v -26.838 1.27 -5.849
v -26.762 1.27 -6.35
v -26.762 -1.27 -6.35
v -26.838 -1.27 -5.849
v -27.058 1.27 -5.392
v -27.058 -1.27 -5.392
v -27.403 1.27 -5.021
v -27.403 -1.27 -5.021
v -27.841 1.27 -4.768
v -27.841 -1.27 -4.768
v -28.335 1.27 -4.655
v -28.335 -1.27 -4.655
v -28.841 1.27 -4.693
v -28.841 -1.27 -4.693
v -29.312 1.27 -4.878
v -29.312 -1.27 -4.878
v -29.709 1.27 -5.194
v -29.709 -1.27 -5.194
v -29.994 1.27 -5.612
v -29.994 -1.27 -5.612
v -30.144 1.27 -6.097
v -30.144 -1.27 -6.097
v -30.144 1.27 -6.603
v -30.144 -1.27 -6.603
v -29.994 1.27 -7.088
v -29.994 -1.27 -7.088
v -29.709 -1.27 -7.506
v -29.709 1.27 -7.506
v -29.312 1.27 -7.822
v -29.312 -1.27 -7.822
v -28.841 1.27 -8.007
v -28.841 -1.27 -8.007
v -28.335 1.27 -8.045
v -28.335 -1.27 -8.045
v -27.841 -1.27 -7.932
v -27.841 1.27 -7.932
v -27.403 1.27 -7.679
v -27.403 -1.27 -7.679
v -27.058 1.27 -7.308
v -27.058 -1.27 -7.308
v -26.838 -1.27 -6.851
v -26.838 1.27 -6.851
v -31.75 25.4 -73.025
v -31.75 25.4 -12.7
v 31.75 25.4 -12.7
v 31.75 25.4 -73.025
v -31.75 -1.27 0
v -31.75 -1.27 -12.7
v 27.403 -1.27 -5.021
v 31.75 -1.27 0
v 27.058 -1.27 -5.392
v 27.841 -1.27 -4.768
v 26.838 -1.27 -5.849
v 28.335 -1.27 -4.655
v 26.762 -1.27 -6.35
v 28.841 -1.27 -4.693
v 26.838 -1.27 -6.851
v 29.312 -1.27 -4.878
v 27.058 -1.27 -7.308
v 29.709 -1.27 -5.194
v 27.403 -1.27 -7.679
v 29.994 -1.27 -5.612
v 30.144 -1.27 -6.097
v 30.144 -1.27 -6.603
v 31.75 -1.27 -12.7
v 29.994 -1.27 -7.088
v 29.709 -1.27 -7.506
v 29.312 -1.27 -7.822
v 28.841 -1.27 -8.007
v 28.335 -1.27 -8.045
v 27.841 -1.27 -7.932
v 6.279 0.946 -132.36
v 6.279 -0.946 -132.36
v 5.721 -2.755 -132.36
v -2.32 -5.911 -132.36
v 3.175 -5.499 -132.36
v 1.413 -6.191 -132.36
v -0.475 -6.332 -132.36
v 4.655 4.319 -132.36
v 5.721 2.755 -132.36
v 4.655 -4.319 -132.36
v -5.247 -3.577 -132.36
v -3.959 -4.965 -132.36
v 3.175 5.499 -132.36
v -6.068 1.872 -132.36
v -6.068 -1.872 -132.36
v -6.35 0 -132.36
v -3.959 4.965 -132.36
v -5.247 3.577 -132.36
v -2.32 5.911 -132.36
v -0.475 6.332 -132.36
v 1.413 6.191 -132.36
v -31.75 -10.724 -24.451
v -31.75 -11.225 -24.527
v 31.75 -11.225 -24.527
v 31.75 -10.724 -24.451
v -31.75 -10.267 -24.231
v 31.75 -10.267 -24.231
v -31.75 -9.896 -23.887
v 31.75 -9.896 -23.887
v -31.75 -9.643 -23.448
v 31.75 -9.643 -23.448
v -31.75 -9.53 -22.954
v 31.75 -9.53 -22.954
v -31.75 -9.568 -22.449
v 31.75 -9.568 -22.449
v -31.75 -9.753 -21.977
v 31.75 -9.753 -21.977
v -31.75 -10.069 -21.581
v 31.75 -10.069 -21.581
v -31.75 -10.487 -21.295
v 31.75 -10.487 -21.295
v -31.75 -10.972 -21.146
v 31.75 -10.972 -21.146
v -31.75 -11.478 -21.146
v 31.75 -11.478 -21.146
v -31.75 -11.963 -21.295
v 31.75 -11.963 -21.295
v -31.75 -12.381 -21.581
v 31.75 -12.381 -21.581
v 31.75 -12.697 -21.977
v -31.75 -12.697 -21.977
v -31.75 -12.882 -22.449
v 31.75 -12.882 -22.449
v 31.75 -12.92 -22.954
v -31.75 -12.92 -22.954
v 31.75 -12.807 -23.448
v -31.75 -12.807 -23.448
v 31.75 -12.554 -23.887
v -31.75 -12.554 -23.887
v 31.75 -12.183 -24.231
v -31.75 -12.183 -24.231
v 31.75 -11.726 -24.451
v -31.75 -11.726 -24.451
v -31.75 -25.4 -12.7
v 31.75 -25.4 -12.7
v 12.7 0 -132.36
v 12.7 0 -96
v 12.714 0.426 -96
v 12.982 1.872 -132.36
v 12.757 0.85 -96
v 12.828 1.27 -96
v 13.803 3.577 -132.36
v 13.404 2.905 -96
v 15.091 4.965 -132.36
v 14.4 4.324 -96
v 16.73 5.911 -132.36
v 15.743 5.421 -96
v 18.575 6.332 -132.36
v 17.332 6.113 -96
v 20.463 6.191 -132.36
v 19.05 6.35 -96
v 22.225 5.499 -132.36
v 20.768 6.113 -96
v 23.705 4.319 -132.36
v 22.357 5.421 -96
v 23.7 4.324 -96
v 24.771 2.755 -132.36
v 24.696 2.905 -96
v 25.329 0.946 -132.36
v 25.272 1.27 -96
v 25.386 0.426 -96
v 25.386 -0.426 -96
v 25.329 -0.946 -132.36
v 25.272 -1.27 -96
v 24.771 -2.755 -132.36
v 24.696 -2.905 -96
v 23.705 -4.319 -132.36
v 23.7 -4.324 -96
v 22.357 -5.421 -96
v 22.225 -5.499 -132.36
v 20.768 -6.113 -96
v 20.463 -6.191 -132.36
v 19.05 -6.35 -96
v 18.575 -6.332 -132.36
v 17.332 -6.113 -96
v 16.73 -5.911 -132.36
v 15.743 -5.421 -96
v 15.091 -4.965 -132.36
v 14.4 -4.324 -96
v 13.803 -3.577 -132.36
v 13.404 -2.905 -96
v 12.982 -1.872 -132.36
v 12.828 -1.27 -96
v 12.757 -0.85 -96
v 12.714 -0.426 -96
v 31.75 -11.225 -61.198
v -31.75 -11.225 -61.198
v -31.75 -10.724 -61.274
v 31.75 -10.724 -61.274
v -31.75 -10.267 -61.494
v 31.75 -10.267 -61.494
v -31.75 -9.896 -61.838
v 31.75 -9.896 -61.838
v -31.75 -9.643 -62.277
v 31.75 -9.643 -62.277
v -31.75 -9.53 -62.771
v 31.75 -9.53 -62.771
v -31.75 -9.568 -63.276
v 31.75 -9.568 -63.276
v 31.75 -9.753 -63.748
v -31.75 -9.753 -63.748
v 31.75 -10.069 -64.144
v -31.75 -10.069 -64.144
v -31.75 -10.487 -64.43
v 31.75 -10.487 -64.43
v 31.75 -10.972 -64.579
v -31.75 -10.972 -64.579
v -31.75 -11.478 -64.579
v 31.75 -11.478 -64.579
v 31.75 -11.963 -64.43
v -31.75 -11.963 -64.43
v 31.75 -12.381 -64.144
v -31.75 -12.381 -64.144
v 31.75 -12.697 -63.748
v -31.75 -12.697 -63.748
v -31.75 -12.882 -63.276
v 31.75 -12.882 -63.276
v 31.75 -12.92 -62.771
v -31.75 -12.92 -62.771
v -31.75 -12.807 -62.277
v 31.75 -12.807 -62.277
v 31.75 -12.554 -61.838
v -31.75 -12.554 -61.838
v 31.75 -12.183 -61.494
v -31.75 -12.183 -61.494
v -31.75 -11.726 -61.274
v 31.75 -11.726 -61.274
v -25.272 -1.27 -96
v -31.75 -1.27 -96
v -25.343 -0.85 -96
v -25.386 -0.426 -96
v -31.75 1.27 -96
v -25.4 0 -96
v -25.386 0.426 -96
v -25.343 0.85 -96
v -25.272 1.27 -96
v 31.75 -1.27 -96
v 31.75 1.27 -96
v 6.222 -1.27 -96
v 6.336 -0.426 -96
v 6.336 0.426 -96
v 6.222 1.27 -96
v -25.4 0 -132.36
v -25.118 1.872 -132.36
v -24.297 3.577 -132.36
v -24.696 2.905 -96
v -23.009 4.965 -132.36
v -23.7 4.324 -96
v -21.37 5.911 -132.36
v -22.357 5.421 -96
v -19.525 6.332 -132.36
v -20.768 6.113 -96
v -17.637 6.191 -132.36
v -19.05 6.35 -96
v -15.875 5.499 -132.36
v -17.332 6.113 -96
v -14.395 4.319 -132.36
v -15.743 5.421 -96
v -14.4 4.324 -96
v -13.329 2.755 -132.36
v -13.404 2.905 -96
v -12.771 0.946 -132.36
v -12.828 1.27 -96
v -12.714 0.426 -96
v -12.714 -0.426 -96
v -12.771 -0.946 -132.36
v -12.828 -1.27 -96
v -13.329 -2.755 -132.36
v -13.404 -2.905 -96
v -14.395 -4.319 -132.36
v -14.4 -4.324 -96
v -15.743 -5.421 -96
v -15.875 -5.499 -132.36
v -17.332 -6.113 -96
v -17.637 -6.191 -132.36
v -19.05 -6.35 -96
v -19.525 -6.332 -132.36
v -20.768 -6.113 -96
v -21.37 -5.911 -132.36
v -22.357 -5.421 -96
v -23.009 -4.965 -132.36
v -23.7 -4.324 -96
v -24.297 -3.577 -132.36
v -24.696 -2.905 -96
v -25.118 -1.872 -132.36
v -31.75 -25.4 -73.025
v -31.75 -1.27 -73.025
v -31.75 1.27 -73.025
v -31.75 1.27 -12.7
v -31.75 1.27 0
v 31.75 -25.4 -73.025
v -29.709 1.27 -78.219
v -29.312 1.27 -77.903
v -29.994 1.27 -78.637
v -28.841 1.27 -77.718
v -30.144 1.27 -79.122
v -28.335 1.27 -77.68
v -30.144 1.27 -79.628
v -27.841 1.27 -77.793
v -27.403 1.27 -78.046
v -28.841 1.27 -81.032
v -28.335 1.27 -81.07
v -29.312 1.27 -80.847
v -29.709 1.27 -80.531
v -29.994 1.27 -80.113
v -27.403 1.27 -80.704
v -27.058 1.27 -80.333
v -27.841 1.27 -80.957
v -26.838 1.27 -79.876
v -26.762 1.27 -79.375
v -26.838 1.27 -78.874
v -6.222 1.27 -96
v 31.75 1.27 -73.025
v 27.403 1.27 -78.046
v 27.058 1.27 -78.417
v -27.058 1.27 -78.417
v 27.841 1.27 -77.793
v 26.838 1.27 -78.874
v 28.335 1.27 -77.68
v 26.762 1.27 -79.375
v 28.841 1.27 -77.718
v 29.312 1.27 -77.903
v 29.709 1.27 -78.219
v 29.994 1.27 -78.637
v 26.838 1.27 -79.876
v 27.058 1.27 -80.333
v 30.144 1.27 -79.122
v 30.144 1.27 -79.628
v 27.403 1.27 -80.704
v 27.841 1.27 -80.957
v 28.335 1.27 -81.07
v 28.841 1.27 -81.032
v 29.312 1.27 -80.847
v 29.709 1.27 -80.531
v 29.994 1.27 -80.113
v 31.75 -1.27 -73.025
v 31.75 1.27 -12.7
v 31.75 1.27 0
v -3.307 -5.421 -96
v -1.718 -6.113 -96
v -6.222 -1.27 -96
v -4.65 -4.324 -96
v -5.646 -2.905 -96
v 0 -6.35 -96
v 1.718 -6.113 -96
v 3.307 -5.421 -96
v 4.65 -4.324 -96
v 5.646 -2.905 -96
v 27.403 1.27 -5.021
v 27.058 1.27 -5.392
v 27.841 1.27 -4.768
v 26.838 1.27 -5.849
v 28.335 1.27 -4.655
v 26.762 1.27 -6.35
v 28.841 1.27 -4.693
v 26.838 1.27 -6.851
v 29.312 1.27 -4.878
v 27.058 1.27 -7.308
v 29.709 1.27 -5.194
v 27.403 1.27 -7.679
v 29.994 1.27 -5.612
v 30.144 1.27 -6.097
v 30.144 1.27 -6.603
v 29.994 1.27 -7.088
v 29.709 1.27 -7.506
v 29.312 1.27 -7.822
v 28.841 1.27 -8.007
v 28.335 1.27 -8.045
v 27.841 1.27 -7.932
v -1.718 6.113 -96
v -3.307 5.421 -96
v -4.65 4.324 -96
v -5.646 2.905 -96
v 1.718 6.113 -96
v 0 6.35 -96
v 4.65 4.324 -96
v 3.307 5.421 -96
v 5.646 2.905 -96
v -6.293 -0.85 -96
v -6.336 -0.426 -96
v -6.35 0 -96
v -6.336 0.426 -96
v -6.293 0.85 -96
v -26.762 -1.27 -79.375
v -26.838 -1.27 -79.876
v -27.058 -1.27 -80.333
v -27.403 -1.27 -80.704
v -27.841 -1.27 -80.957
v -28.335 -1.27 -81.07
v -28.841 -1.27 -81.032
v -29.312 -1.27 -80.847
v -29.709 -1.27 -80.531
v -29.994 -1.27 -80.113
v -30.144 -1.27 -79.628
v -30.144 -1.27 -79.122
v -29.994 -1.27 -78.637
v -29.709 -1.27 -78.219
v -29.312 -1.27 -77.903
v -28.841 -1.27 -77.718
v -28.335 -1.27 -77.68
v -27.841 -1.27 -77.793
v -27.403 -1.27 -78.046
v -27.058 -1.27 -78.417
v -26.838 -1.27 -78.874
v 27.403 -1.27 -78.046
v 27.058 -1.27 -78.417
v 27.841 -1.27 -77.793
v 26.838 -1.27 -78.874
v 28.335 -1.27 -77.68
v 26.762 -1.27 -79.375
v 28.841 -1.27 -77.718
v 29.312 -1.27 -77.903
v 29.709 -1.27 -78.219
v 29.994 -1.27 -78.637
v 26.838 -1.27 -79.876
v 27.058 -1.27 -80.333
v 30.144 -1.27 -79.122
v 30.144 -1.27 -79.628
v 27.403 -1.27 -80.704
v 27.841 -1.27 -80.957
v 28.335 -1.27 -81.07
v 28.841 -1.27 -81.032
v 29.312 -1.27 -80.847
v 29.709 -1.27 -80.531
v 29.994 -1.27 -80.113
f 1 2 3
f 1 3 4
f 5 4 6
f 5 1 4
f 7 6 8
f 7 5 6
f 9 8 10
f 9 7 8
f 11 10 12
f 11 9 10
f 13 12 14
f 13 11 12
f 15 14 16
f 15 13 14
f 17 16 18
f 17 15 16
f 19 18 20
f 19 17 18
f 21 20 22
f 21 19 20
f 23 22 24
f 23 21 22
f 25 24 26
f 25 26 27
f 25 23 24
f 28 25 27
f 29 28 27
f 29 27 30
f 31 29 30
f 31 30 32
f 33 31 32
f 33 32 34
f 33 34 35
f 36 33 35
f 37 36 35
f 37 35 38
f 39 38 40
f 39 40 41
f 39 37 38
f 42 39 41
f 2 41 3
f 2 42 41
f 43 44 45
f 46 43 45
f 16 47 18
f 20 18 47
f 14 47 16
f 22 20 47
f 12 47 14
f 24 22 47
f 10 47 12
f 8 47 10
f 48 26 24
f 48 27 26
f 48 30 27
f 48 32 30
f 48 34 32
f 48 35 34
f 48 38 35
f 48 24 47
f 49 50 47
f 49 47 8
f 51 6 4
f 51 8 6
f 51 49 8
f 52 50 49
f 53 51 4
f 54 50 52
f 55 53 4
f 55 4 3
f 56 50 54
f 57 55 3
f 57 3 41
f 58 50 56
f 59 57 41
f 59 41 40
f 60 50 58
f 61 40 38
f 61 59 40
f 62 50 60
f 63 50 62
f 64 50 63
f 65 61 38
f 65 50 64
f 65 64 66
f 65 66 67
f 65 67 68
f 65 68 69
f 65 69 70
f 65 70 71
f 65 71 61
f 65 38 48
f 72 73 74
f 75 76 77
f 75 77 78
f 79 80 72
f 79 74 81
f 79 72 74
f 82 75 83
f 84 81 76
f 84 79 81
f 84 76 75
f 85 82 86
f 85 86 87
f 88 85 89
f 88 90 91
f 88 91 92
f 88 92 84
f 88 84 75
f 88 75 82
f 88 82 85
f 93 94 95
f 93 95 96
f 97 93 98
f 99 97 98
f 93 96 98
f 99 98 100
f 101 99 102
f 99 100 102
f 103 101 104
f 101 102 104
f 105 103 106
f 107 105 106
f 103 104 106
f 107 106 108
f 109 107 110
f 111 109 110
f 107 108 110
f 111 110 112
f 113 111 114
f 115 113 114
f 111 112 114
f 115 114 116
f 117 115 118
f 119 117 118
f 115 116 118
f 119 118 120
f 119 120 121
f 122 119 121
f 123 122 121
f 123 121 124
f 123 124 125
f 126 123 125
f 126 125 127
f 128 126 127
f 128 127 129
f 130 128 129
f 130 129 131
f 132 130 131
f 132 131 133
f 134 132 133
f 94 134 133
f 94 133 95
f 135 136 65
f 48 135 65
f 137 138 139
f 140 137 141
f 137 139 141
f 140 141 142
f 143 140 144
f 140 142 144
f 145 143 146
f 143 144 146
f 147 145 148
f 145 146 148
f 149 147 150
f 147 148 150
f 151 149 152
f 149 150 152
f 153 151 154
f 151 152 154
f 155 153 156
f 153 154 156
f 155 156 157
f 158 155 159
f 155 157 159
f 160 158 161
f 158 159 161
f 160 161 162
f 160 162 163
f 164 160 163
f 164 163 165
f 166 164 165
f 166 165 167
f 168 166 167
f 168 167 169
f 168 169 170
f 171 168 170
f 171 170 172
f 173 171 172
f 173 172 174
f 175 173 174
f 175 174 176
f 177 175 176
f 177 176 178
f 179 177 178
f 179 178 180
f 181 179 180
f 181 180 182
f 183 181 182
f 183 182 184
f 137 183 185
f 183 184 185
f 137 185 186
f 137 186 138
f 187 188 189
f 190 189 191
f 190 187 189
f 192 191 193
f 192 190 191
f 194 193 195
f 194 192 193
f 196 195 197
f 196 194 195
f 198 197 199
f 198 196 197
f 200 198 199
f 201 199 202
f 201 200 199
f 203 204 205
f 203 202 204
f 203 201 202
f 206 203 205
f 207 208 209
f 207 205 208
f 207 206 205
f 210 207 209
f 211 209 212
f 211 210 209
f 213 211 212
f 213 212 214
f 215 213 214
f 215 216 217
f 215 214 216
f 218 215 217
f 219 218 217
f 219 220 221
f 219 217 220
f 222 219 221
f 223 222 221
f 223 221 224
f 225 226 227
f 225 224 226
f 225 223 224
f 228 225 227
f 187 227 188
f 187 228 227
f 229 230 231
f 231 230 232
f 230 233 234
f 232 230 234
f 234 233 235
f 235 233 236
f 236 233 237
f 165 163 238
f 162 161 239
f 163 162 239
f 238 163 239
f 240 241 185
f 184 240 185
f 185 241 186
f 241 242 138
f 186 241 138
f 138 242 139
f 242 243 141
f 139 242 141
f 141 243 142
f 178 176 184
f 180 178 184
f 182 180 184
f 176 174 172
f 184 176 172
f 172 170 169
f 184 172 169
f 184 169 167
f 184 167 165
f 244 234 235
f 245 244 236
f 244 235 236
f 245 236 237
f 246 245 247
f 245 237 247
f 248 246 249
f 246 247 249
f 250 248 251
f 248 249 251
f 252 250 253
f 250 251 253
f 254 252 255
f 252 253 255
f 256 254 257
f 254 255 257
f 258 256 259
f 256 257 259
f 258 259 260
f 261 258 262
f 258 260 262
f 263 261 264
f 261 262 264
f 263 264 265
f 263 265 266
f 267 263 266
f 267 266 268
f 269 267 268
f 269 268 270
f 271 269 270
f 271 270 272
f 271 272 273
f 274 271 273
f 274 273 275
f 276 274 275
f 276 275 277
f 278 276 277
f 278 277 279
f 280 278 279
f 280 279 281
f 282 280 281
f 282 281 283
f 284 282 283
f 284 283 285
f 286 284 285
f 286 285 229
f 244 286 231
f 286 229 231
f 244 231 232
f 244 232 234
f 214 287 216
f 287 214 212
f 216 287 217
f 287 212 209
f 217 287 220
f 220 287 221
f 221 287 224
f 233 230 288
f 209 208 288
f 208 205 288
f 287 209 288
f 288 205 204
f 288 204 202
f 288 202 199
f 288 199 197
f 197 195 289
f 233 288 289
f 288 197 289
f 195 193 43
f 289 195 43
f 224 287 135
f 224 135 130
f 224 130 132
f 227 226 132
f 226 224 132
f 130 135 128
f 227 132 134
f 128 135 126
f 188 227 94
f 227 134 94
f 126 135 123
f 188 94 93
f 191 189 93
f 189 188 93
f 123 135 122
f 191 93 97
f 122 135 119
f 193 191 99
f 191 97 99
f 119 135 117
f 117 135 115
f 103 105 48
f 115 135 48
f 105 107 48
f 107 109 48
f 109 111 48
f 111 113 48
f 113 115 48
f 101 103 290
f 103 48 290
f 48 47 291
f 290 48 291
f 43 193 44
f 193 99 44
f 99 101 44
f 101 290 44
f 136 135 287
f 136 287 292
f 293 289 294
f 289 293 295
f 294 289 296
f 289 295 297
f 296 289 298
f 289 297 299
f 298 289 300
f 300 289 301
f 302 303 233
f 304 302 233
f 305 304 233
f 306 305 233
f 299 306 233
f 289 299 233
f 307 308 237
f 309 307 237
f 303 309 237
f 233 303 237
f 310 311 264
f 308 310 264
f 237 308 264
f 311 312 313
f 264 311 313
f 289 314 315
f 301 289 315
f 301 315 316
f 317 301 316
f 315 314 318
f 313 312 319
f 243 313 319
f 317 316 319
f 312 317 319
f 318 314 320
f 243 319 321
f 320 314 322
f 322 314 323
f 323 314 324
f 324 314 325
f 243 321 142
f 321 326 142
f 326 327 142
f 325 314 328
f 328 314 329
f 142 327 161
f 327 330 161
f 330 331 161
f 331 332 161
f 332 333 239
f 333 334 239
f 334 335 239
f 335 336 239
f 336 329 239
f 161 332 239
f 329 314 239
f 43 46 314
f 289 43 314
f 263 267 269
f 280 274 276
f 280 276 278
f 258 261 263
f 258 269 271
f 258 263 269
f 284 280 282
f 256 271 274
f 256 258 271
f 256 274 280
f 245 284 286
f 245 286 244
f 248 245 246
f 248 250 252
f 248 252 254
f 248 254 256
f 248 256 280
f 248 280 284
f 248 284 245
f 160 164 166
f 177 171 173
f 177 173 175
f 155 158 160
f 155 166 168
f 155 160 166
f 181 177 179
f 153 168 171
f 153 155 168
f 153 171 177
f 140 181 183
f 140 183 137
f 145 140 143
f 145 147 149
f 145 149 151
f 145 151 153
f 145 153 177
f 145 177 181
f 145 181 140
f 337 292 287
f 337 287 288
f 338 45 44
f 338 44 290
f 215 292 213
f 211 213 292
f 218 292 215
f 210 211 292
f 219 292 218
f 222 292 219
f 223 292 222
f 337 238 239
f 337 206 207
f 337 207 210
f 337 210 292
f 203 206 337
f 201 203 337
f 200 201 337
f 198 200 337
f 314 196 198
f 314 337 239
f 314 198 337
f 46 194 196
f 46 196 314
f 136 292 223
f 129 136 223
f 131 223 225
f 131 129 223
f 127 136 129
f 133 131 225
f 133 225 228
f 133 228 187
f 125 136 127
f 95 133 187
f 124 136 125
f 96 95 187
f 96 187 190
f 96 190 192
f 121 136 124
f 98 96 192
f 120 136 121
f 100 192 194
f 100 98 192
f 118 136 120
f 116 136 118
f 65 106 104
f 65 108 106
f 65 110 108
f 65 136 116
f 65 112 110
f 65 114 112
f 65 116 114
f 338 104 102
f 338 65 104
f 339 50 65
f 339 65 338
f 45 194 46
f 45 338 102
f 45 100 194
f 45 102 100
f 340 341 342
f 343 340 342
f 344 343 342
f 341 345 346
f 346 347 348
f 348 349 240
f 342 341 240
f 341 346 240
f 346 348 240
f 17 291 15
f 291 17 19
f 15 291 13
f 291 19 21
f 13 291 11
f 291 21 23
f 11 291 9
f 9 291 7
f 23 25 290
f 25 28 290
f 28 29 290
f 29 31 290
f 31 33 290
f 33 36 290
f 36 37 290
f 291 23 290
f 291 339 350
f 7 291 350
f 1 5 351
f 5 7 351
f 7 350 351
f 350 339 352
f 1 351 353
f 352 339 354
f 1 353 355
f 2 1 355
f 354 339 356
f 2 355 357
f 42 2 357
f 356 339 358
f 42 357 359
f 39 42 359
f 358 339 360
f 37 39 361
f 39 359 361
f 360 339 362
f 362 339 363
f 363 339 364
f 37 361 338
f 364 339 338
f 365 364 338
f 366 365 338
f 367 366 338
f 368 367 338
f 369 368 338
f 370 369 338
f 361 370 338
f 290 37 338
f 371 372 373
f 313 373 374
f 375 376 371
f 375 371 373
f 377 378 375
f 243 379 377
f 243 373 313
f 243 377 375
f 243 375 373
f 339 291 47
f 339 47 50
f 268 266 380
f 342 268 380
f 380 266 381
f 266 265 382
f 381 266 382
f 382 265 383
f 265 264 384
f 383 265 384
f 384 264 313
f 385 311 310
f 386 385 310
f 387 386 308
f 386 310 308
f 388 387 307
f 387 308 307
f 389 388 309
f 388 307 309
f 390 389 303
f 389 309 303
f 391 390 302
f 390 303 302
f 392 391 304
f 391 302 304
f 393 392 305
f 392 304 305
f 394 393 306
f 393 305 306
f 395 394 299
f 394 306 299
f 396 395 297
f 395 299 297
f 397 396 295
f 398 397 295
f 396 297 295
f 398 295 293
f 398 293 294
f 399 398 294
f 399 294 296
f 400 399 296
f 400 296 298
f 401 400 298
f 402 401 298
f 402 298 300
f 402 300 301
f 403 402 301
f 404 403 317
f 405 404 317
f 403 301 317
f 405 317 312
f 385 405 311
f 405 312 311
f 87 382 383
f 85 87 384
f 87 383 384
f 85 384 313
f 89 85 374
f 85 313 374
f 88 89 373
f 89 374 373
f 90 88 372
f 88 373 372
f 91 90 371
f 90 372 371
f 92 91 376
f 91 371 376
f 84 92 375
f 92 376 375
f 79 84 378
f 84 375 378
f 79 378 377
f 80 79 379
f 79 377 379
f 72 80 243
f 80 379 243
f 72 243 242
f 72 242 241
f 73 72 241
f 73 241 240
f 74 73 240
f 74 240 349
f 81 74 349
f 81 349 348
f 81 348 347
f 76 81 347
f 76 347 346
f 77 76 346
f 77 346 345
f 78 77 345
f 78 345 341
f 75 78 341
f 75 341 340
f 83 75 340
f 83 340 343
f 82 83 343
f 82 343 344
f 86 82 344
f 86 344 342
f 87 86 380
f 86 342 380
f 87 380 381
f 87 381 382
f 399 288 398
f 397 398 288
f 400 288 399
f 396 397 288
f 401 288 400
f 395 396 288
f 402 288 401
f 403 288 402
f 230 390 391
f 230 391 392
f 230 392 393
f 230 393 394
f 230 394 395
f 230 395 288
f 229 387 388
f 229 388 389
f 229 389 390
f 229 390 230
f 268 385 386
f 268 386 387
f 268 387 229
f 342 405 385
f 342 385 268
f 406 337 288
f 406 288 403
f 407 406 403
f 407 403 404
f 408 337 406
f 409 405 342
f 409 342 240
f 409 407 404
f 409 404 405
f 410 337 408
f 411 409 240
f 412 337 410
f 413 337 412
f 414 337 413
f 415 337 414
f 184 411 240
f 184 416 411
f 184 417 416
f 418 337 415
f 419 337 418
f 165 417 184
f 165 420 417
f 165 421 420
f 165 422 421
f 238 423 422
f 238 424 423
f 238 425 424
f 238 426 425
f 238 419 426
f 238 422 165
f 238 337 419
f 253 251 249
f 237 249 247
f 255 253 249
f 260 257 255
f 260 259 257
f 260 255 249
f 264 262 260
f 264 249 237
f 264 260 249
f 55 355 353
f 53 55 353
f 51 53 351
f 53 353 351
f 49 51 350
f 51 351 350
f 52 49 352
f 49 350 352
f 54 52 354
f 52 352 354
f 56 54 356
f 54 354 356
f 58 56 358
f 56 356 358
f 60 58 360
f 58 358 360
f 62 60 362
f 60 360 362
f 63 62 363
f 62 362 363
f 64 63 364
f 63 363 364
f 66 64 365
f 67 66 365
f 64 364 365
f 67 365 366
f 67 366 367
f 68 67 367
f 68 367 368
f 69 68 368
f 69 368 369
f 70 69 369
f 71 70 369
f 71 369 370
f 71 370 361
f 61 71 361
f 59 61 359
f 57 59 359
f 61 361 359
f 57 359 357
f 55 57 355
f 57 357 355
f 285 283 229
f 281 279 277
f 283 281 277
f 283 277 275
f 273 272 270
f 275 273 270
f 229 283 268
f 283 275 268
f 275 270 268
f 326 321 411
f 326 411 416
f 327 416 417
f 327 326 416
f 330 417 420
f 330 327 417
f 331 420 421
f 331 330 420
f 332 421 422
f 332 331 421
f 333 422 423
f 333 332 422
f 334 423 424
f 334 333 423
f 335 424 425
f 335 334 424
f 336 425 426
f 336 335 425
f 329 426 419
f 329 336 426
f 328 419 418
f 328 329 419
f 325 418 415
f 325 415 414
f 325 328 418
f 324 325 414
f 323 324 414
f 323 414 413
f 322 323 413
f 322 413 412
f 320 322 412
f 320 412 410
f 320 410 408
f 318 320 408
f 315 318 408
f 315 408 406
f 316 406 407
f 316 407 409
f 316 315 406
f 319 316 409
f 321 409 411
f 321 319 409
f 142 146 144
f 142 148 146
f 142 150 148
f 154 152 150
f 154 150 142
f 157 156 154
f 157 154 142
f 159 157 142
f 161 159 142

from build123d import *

# Parameters (mm, degrees)
SKETCH1_W               = 63.5
SKETCH1_H               = 50.8
BOSS_EXTRUDE1_DEPTH     = 96
SKETCH2_R               = 6.35
BOSS_EXTRUDE5_DEPTH     = 36.36
SKETCH3_W               = 12.7
SKETCH3_H               = 24.13
SKETCH3_W_2             = 22.975
CUT_EXTRUDE1_DEPTH      = 64.5
SKETCH4_R               = 1.7
CUT_EXTRUDE2_DEPTH      = 2.54
MIRROR3_COPY_1_SKETCH_R = 1.7
MIRROR3_COPY_1_DEPTH    = 2.54
SKETCH5_R               = 1.7
CUT_EXTRUDE3_DEPTH      = 64.5


with BuildPart() as part:
    # Sketch1 → Boss-Extrude1 (new body)
    with BuildSketch(Plane.XY):
        Rectangle(SKETCH1_W, SKETCH1_H)
    extrude(amount=-BOSS_EXTRUDE1_DEPTH)

    # Sketch2 → Boss-Extrude5 (add)
    with BuildSketch(Plane(origin=(0, 0, -96), x_dir=(-1, 0, 0), z_dir=(0, 0, -1))):
        Circle(SKETCH2_R)
        with Locations((-19.05, 0)):
            Circle(SKETCH2_R)
        with Locations((19.05, 0)):
            Circle(SKETCH2_R)
    extrude(amount=BOSS_EXTRUDE5_DEPTH)

    # Sketch3 → Cut-Extrude1 (cut, through all)
    with BuildSketch(Plane(origin=(31.75, 0, 0), x_dir=(0, 0, -1), z_dir=(1, 0, 0))):
        with Locations((6.35, -13.335)):
            Rectangle(SKETCH3_W, SKETCH3_H)
        with Locations((84.5125, -13.335)):
            Rectangle(SKETCH3_W_2, SKETCH3_H)
    cut_extrude1 = extrude(amount=-CUT_EXTRUDE1_DEPTH, mode=Mode.SUBTRACT)

    # Mirror1: Cut-Extrude1 across plane
    add(cut_extrude1.mirror(Plane.ZX), mode=Mode.SUBTRACT)

    # Sketch4 → Cut-Extrude2 (cut)
    with BuildSketch(Plane(origin=(0, 1.27, 0), x_dir=(1, 0, 0), z_dir=(0, 1, 0))):
        with Locations((-28.4625, 79.375)):
            Circle(SKETCH4_R)
    cut_extrude2 = extrude(amount=-CUT_EXTRUDE2_DEPTH, mode=Mode.SUBTRACT)

    # Mirror2: Cut-Extrude2 across plane
    add(cut_extrude2.mirror(Plane(origin=(0, 0, 0), x_dir=(0, 0, 1), z_dir=(1, 0, 0))), mode=Mode.SUBTRACT)

    # Mirror3: Cut-Extrude2 across plane
    add(cut_extrude2.mirror(Plane(origin=(0, 0, -42.8625), x_dir=(1, 0, 0), z_dir=(0, 0, -1))), mode=Mode.SUBTRACT)

    # Mirror3 copy 1 sketch → Mirror3 copy 1 (cut)
    with BuildSketch(Plane(origin=(0, 1.27, -85.725), x_dir=(-1, 0, 0), z_dir=(0, 1, 0))):
        with Locations((-28.4625, 79.375)):
            Circle(MIRROR3_COPY_1_SKETCH_R)
    extrude(amount=-MIRROR3_COPY_1_DEPTH, mode=Mode.SUBTRACT)

    # Sketch5 → Cut-Extrude3 (cut, through all)
    with BuildSketch(Plane(origin=(31.75, 0, 0), x_dir=(0, 0, -1), z_dir=(1, 0, 0))):
        with Locations((22.826875, -11.225)):
            Circle(SKETCH5_R)
    cut_extrude3 = extrude(amount=-CUT_EXTRUDE3_DEPTH, mode=Mode.SUBTRACT)

    # Mirror4: Cut-Extrude3 across plane
    add(cut_extrude3.mirror(Plane(origin=(0, 0, -42.8625), x_dir=(1, 0, 0), z_dir=(0, 0, -1))), mode=Mode.SUBTRACT)


solid = part.part
